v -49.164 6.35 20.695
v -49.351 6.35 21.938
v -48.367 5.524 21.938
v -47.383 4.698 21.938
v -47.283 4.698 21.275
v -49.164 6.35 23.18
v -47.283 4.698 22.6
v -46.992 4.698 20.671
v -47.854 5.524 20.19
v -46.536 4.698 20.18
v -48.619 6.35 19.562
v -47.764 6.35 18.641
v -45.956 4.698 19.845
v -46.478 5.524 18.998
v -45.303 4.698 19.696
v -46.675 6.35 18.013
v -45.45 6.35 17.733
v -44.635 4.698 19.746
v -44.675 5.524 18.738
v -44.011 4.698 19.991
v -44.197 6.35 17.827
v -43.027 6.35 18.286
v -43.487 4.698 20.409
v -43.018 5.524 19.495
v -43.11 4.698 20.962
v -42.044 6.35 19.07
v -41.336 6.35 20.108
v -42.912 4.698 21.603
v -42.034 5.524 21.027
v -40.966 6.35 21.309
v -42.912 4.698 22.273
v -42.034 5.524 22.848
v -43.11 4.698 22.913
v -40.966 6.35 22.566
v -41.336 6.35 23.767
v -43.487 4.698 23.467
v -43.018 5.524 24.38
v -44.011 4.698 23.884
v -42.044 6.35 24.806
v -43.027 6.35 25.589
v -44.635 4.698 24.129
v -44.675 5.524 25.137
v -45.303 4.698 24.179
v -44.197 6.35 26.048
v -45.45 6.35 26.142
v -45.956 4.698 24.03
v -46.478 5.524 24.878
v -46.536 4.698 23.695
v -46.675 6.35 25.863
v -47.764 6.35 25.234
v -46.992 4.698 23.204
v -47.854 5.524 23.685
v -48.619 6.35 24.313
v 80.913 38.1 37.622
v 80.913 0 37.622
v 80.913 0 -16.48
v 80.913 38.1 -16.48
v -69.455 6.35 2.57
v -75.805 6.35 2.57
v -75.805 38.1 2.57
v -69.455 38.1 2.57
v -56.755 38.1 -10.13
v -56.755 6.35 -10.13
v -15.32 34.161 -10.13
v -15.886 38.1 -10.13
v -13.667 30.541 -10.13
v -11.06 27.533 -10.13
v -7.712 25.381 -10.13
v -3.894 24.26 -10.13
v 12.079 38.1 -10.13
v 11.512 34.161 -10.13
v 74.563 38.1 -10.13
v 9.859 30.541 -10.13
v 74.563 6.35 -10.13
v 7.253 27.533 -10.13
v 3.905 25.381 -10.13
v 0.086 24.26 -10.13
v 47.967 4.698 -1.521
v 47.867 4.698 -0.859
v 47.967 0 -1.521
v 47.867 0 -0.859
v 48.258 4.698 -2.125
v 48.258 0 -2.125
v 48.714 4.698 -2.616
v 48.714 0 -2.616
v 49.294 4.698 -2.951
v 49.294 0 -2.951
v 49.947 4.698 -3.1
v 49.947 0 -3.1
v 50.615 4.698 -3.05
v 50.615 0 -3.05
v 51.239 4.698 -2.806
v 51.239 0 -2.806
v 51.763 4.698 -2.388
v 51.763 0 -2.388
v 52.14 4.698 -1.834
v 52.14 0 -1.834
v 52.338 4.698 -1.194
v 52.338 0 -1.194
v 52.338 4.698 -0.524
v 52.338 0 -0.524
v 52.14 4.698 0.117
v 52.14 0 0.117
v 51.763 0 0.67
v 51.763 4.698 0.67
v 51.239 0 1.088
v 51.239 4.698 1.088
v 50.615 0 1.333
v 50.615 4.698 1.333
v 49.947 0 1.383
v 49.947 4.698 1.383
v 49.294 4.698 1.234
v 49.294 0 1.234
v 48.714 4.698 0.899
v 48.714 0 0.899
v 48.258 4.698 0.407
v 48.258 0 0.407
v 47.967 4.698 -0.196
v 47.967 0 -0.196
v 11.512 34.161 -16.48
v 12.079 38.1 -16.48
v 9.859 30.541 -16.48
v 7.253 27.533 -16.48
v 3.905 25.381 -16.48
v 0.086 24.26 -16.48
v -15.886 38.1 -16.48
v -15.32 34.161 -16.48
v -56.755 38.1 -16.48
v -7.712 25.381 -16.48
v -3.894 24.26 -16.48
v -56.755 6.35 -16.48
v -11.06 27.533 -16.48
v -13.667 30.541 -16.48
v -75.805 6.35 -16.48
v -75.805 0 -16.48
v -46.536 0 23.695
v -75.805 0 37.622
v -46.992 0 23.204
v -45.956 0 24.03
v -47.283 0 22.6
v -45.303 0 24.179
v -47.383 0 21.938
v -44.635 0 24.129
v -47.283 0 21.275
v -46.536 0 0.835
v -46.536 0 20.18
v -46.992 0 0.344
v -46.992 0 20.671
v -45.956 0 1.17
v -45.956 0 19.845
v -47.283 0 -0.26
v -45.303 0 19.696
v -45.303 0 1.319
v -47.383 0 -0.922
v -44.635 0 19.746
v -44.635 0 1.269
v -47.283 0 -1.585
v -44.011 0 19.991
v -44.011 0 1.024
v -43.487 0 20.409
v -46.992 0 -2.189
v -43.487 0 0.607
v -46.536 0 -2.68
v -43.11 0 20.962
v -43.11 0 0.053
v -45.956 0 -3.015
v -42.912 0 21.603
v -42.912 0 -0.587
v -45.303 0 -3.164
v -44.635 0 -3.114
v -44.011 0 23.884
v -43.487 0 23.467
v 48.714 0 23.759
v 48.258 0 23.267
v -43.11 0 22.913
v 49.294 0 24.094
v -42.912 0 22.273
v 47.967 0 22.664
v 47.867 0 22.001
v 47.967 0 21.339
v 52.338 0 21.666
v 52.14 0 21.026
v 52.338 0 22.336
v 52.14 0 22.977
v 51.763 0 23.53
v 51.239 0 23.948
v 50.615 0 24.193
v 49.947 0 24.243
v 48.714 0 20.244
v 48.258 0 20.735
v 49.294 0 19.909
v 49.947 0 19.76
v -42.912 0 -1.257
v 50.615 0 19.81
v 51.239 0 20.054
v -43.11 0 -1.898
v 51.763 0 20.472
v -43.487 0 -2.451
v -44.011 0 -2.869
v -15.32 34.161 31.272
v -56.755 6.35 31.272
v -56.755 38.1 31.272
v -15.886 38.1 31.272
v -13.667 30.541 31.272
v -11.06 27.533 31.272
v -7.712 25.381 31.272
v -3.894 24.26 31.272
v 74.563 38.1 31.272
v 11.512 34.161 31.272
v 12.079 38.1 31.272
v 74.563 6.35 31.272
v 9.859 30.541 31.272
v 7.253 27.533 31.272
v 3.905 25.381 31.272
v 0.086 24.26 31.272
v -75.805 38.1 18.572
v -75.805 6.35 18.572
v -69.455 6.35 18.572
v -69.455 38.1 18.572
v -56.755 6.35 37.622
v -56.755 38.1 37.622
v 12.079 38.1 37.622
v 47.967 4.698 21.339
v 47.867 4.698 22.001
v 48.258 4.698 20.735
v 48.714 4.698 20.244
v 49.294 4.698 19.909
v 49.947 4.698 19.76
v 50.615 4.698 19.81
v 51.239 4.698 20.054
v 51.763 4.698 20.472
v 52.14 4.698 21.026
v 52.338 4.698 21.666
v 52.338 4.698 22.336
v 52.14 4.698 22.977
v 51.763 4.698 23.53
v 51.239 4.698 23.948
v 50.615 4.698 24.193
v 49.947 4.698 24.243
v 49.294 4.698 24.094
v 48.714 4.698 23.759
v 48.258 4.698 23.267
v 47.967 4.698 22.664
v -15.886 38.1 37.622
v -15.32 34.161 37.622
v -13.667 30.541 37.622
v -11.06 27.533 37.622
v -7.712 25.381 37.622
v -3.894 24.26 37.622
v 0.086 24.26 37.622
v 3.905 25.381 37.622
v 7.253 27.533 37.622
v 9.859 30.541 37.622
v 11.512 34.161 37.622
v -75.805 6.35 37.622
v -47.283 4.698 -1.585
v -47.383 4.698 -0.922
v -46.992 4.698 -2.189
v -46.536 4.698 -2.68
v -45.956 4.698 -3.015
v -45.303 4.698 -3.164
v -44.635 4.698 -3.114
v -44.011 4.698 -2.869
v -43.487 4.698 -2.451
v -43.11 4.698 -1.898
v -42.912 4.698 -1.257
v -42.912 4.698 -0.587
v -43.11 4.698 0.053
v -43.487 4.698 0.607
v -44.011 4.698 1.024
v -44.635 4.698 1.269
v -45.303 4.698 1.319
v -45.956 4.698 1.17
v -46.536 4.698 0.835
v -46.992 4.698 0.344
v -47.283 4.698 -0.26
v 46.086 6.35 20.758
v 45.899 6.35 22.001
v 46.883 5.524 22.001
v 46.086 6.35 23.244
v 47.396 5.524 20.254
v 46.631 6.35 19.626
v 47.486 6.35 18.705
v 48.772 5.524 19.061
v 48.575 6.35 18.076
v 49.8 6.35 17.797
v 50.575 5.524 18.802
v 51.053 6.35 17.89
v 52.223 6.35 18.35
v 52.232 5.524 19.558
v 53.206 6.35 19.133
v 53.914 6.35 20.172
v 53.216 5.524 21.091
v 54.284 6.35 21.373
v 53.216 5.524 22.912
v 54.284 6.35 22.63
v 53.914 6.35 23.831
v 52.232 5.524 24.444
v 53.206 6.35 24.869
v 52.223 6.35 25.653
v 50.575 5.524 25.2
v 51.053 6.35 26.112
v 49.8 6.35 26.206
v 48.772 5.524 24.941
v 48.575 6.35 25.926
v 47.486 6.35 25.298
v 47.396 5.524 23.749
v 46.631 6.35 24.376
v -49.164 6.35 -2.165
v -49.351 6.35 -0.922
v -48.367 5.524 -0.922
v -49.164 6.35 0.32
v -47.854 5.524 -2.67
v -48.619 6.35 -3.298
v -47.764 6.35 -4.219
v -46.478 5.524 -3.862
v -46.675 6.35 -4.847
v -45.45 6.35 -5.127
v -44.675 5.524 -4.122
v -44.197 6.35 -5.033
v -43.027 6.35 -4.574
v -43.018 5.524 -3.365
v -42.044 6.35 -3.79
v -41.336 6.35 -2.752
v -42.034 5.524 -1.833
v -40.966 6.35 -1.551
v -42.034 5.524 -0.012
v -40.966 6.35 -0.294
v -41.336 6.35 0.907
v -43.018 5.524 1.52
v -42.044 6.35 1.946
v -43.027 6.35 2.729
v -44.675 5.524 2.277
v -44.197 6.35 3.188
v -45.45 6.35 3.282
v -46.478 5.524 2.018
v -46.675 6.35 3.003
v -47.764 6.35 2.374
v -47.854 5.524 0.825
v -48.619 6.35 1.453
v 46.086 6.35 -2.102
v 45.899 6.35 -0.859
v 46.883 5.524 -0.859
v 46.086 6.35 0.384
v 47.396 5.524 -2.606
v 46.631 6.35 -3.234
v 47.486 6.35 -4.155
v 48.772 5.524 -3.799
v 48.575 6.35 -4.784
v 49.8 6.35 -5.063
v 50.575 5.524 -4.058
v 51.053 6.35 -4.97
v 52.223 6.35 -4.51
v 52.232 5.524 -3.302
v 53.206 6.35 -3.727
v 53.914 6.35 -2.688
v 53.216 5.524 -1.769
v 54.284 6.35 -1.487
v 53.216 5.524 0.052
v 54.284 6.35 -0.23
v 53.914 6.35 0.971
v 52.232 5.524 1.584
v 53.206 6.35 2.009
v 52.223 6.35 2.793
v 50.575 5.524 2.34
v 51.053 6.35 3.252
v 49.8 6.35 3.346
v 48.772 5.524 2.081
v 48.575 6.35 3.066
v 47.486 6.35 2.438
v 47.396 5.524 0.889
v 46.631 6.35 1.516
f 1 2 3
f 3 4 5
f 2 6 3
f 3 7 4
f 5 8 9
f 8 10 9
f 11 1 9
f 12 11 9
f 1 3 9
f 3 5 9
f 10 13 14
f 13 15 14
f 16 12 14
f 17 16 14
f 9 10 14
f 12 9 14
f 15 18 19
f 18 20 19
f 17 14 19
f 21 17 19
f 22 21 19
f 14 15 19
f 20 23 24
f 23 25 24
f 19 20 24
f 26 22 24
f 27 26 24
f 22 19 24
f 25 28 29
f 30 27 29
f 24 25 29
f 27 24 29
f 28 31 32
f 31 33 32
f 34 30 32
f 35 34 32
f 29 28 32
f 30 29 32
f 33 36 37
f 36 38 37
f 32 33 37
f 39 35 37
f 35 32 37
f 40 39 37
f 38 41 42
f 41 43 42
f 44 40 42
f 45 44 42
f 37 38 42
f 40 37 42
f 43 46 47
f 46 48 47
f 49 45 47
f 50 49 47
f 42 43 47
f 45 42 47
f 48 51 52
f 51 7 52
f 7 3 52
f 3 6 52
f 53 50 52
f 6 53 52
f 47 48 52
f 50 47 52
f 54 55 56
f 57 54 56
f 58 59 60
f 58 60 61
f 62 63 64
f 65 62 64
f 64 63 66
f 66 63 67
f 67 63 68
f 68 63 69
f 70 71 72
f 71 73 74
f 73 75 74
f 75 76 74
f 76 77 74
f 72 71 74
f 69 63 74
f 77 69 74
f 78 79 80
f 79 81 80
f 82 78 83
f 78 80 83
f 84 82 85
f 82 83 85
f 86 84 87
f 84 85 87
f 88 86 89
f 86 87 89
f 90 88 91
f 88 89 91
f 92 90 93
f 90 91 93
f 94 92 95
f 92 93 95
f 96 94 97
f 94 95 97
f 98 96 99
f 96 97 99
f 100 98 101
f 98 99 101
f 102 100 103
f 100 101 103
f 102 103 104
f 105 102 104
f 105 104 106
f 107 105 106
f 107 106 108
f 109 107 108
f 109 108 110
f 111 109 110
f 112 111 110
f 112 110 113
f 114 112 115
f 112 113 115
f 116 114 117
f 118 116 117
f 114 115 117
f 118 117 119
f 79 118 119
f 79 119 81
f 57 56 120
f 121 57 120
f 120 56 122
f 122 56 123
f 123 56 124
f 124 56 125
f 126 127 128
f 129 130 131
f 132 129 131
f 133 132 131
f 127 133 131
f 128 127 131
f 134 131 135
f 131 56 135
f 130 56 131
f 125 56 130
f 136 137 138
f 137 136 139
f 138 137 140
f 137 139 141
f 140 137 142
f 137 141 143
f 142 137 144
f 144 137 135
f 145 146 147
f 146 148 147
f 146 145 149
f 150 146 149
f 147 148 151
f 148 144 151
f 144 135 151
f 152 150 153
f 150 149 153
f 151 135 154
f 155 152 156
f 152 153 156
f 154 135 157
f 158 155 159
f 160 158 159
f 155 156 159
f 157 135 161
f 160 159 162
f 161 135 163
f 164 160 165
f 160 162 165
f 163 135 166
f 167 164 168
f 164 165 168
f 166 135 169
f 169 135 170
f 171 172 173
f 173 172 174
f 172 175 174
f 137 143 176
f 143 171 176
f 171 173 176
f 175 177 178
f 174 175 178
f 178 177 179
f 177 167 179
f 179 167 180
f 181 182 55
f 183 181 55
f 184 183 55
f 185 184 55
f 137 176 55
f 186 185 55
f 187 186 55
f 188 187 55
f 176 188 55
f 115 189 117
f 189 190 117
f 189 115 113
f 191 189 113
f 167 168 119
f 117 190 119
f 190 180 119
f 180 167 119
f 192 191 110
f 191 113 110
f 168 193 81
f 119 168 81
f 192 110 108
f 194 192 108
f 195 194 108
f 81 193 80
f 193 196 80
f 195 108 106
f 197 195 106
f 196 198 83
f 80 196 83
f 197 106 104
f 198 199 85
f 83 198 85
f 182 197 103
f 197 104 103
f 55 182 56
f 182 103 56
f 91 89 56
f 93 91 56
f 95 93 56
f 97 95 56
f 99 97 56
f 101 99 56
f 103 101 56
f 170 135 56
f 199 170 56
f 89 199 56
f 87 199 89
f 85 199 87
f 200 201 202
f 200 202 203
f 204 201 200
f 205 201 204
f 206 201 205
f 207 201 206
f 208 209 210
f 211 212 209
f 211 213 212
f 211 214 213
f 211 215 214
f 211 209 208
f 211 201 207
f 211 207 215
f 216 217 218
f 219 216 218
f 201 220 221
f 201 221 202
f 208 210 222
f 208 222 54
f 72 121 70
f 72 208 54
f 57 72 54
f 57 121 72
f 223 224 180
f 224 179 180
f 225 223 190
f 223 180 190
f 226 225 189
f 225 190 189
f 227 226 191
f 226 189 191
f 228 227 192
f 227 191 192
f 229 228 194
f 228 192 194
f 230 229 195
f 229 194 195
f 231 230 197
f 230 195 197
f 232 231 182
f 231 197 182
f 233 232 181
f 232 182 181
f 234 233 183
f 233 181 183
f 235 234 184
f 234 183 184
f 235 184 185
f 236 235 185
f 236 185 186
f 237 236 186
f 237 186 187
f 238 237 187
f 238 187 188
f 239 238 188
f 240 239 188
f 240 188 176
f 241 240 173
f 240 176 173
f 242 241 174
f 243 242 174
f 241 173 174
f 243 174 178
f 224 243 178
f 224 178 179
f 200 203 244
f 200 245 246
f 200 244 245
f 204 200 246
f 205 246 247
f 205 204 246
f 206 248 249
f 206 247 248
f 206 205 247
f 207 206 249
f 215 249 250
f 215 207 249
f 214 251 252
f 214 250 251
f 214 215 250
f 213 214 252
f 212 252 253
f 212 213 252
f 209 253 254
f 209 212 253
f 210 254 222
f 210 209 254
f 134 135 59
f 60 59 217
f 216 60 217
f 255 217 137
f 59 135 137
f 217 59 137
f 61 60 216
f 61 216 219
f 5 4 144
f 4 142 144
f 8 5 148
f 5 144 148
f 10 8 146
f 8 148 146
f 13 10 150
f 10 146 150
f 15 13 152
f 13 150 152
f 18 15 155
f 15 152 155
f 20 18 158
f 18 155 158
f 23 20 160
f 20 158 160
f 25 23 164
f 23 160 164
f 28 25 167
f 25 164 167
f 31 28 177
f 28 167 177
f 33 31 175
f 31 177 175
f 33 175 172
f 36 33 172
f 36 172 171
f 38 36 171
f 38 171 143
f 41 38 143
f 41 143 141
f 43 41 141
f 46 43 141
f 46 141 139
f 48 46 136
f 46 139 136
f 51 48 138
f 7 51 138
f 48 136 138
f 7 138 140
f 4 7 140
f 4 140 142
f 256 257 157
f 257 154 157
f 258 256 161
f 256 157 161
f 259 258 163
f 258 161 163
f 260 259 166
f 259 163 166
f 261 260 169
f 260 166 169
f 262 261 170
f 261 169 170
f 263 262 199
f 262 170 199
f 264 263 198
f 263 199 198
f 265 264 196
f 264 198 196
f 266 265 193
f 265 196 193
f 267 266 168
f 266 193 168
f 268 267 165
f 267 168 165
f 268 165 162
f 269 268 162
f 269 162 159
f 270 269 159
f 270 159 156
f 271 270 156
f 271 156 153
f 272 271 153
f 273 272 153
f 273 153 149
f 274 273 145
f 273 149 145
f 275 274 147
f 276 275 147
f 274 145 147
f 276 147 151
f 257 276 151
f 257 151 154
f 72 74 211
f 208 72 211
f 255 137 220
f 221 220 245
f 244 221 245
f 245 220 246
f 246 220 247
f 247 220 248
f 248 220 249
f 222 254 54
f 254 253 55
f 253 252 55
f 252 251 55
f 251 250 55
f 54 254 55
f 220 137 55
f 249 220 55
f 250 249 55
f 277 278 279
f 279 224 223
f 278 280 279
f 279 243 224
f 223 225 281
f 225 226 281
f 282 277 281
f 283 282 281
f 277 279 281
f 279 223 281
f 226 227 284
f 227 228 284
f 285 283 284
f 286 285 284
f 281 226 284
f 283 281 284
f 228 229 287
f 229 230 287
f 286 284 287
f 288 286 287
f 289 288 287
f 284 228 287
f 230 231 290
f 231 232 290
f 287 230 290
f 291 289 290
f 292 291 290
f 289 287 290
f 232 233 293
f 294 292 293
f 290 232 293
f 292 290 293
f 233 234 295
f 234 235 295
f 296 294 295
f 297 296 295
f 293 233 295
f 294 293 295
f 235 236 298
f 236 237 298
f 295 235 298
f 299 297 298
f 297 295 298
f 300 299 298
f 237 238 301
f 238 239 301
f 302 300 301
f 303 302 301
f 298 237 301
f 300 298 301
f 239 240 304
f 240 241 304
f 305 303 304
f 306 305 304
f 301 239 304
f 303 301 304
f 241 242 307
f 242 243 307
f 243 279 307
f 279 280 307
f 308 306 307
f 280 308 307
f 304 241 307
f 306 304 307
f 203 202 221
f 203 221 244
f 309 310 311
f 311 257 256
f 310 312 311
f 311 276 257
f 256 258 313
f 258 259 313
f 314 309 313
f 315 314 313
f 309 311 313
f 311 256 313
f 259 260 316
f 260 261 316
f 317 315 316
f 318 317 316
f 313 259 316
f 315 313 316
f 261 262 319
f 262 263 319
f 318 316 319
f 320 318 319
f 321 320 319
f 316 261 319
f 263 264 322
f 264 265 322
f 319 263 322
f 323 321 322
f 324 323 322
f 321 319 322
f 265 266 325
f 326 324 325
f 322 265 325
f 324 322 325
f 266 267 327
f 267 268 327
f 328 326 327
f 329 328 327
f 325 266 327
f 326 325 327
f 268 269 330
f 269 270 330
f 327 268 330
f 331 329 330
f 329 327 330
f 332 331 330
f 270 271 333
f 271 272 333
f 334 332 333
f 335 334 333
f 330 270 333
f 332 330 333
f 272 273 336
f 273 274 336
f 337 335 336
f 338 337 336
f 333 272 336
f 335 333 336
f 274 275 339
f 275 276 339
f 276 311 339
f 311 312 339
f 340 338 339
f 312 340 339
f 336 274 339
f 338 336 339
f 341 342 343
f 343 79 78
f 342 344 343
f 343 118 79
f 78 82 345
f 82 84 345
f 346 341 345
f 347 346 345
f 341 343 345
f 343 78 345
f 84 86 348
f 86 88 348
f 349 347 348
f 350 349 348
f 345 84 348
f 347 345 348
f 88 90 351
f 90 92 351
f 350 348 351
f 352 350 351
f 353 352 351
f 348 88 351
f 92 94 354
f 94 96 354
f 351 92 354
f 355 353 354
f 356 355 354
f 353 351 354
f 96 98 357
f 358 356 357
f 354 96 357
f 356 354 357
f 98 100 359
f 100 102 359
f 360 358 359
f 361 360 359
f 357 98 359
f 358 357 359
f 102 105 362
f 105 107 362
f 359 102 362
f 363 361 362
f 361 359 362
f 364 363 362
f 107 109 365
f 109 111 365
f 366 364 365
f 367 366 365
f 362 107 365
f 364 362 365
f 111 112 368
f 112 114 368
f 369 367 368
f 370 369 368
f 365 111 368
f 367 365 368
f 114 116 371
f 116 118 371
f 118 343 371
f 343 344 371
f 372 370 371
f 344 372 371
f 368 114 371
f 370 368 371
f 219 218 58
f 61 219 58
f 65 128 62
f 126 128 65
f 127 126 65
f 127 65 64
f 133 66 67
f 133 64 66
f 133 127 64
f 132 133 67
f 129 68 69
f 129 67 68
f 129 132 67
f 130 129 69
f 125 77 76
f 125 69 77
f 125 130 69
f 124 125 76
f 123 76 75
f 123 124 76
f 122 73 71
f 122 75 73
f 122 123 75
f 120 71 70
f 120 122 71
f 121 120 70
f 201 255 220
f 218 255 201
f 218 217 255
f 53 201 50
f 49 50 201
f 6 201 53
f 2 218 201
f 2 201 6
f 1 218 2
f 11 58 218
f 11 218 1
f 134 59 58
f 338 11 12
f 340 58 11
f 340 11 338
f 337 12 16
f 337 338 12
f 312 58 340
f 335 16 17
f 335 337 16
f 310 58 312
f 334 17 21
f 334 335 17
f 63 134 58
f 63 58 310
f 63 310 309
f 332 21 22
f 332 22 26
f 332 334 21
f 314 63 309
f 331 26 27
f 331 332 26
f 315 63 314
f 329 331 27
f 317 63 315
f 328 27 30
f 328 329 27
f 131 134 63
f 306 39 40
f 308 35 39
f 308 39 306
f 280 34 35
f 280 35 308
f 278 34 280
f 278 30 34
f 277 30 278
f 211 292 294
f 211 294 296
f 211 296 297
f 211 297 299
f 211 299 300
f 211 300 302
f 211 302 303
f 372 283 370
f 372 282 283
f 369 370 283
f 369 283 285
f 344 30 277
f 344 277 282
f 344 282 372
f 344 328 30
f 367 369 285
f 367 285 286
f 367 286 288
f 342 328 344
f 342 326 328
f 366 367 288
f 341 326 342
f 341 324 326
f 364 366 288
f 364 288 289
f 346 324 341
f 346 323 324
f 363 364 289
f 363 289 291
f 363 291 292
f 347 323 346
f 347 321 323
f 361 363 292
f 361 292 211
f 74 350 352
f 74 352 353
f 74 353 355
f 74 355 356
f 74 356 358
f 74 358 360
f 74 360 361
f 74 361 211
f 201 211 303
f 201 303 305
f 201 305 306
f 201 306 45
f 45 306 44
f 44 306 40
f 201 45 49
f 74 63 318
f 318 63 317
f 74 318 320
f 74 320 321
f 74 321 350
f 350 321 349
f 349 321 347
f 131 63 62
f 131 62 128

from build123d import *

# Parameters (mm, degrees)
SKETCH1_W                                         = 6.35
SKETCH1_H                                         = 16.002
BOSS_EXTRUDE1_DEPTH                               = 38.1
SKETCH1_H_2                                       = 54.102
BOSS_EXTRUDE1_2_DEPTH                             = 38.1
BOSS_EXTRUDE2_DEPTH                               = 6.35
SKETCH1_5_W                                       = 131.318
SKETCH1_5_H                                       = 6.35
BOSS_EXTRUDE3_DEPTH                               = 38.1
CSK_FOR_8_FLAT_HEAD_MACHINE_SCREW_100_D           = 4.4958
CSK_FOR_8_FLAT_HEAD_MACHINE_SCREW_100_CSINK_D     = 8.4328
CSK_FOR_8_FLAT_HEAD_MACHINE_SCREW_100_CSINK_ANGLE = 100
BOSS_EXTRUDE6_DEPTH                               = 6.35
CUT_EXTRUDE3_DEPTH                                = 105.525006773
CUT_EXTRUDE3_DEPTH_BACK                           = 105.525006773
BOSS_EXTRUDE7_DEPTH                               = 6.35


with BuildPart() as part:
    # Sketch1 → Boss-Extrude1 (new body)
    with BuildSketch(Plane(origin=(0, 0, 0), x_dir=(1, 0, 0), z_dir=(0, 1, 0))):
        with Locations((-72.630450684, -10.571178218)):
            Rectangle(SKETCH1_W, SKETCH1_H)
    extrude(amount=BOSS_EXTRUDE1_DEPTH)



with BuildPart() as body_2:
    # Sketch1 → Boss-Extrude1 2 (new body)
    with BuildSketch(Plane(origin=(0, 0, 0), x_dir=(1, 0, 0), z_dir=(0, 1, 0))):
        with Locations((77.737549316, -10.571178218)):
            Rectangle(SKETCH1_W, SKETCH1_H_2)
    extrude(amount=BOSS_EXTRUDE1_2_DEPTH)


with BuildPart() as part_1:
    add(part.part)

    add(body_2.part)  # Boss-Extrude2 merges body 2
    # Sketch1<4> → Boss-Extrude2 (add)
    with BuildSketch(Plane(origin=(0, 0, 0), x_dir=(1, 0, 0), z_dir=(0, 1, 0))):
        Polygon((-56.755450684, 10.129821782), (-69.455450684, 10.129821782), (-69.455450684, -2.570178218), (-69.455450684, -18.572178218), (-69.455450684, -31.272178218), (-56.755450684, -31.272178218), (74.562549316, -31.272178218), (74.562549316, 10.129821782), align=None)
    extrude(amount=BOSS_EXTRUDE2_DEPTH)

    # Sketch1<5> → Boss-Extrude3 (add)
    with BuildSketch(Plane(origin=(0, 0, 0), x_dir=(1, 0, 0), z_dir=(0, 1, 0))):
        with Locations((8.903549316, 13.304821782)):
            Rectangle(SKETCH1_5_W, SKETCH1_5_H)
        with Locations((8.903549316, -34.447178218)):
            Rectangle(SKETCH1_5_W, SKETCH1_5_H)
    extrude(amount=BOSS_EXTRUDE3_DEPTH)

    # CSK for #8 Flat Head Machine Screw (100)2 (through all)
    with Locations(Plane(origin=(0, 6.35, 0), x_dir=(1, 0, 0), z_dir=(0, 1, 0))):
        with Locations((-45.134950684, -21.937678218), (-45.134950684, 0.922321782), (50.115049316, 0.858821782), (50.115049316, -22.001178218)):
            CounterSinkHole(CSK_FOR_8_FLAT_HEAD_MACHINE_SCREW_100_D / 2, CSK_FOR_8_FLAT_HEAD_MACHINE_SCREW_100_CSINK_D / 2, counter_sink_angle=CSK_FOR_8_FLAT_HEAD_MACHINE_SCREW_100_CSINK_ANGLE)

    # Sketch1<8> → Boss-Extrude6 (add)
    with BuildSketch(Plane(origin=(0, 0, 0), x_dir=(1, 0, 0), z_dir=(0, 1, 0))):
        Polygon((-69.455450684, -31.272178218), (-69.455450684, -18.572178218), (-75.805450684, -18.572178218), (-75.805450684, -31.272178218), (-75.805450684, -37.622178218), (-56.755450684, -37.622178218), (-56.755450684, -31.272178218), align=None)
    extrude(amount=BOSS_EXTRUDE6_DEPTH)

    # Sketch11 → Cut-Extrude3 (cut, two sides: drawn at the far end of the back side and taken through both)
    with BuildSketch(Plane.XY.offset(37.622178218).offset(-CUT_EXTRUDE3_DEPTH_BACK)):
        with BuildLine():
            Line((-15.886355633, 256.15420447), (-15.886355633, 38.1))
            ThreePointArc((-15.886355633, 38.1), (-1.903903158, 24.117547525), (12.078549316, 38.1))
            Line((12.078549316, 38.1), (12.078549316, 256.15420447))
            Line((12.078549316, 256.15420447), (12.078549316, 692.262613411))
            Line((12.078549316, 692.262613411), (-15.886355633, 692.262613411))
            Line((-15.886355633, 692.262613411), (-15.886355633, 256.15420447))
        make_face()
    extrude(amount=CUT_EXTRUDE3_DEPTH + CUT_EXTRUDE3_DEPTH_BACK, mode=Mode.SUBTRACT)

    # Sketch1<9> → Boss-Extrude7 (add)
    with BuildSketch(Plane(origin=(0, 0, 0), x_dir=(1, 0, 0), z_dir=(0, 1, 0))):
        Polygon((-69.455450684, -2.570178218), (-69.455450684, 10.129821782), (-56.755450684, 10.129821782), (-56.755450684, 16.479821782), (-69.455450684, 16.479821782), (-75.805450684, 16.479821782), (-75.805450684, 10.129821782), (-75.805450684, -2.570178218), align=None)
    extrude(amount=BOSS_EXTRUDE7_DEPTH)


solid = part_1.part
